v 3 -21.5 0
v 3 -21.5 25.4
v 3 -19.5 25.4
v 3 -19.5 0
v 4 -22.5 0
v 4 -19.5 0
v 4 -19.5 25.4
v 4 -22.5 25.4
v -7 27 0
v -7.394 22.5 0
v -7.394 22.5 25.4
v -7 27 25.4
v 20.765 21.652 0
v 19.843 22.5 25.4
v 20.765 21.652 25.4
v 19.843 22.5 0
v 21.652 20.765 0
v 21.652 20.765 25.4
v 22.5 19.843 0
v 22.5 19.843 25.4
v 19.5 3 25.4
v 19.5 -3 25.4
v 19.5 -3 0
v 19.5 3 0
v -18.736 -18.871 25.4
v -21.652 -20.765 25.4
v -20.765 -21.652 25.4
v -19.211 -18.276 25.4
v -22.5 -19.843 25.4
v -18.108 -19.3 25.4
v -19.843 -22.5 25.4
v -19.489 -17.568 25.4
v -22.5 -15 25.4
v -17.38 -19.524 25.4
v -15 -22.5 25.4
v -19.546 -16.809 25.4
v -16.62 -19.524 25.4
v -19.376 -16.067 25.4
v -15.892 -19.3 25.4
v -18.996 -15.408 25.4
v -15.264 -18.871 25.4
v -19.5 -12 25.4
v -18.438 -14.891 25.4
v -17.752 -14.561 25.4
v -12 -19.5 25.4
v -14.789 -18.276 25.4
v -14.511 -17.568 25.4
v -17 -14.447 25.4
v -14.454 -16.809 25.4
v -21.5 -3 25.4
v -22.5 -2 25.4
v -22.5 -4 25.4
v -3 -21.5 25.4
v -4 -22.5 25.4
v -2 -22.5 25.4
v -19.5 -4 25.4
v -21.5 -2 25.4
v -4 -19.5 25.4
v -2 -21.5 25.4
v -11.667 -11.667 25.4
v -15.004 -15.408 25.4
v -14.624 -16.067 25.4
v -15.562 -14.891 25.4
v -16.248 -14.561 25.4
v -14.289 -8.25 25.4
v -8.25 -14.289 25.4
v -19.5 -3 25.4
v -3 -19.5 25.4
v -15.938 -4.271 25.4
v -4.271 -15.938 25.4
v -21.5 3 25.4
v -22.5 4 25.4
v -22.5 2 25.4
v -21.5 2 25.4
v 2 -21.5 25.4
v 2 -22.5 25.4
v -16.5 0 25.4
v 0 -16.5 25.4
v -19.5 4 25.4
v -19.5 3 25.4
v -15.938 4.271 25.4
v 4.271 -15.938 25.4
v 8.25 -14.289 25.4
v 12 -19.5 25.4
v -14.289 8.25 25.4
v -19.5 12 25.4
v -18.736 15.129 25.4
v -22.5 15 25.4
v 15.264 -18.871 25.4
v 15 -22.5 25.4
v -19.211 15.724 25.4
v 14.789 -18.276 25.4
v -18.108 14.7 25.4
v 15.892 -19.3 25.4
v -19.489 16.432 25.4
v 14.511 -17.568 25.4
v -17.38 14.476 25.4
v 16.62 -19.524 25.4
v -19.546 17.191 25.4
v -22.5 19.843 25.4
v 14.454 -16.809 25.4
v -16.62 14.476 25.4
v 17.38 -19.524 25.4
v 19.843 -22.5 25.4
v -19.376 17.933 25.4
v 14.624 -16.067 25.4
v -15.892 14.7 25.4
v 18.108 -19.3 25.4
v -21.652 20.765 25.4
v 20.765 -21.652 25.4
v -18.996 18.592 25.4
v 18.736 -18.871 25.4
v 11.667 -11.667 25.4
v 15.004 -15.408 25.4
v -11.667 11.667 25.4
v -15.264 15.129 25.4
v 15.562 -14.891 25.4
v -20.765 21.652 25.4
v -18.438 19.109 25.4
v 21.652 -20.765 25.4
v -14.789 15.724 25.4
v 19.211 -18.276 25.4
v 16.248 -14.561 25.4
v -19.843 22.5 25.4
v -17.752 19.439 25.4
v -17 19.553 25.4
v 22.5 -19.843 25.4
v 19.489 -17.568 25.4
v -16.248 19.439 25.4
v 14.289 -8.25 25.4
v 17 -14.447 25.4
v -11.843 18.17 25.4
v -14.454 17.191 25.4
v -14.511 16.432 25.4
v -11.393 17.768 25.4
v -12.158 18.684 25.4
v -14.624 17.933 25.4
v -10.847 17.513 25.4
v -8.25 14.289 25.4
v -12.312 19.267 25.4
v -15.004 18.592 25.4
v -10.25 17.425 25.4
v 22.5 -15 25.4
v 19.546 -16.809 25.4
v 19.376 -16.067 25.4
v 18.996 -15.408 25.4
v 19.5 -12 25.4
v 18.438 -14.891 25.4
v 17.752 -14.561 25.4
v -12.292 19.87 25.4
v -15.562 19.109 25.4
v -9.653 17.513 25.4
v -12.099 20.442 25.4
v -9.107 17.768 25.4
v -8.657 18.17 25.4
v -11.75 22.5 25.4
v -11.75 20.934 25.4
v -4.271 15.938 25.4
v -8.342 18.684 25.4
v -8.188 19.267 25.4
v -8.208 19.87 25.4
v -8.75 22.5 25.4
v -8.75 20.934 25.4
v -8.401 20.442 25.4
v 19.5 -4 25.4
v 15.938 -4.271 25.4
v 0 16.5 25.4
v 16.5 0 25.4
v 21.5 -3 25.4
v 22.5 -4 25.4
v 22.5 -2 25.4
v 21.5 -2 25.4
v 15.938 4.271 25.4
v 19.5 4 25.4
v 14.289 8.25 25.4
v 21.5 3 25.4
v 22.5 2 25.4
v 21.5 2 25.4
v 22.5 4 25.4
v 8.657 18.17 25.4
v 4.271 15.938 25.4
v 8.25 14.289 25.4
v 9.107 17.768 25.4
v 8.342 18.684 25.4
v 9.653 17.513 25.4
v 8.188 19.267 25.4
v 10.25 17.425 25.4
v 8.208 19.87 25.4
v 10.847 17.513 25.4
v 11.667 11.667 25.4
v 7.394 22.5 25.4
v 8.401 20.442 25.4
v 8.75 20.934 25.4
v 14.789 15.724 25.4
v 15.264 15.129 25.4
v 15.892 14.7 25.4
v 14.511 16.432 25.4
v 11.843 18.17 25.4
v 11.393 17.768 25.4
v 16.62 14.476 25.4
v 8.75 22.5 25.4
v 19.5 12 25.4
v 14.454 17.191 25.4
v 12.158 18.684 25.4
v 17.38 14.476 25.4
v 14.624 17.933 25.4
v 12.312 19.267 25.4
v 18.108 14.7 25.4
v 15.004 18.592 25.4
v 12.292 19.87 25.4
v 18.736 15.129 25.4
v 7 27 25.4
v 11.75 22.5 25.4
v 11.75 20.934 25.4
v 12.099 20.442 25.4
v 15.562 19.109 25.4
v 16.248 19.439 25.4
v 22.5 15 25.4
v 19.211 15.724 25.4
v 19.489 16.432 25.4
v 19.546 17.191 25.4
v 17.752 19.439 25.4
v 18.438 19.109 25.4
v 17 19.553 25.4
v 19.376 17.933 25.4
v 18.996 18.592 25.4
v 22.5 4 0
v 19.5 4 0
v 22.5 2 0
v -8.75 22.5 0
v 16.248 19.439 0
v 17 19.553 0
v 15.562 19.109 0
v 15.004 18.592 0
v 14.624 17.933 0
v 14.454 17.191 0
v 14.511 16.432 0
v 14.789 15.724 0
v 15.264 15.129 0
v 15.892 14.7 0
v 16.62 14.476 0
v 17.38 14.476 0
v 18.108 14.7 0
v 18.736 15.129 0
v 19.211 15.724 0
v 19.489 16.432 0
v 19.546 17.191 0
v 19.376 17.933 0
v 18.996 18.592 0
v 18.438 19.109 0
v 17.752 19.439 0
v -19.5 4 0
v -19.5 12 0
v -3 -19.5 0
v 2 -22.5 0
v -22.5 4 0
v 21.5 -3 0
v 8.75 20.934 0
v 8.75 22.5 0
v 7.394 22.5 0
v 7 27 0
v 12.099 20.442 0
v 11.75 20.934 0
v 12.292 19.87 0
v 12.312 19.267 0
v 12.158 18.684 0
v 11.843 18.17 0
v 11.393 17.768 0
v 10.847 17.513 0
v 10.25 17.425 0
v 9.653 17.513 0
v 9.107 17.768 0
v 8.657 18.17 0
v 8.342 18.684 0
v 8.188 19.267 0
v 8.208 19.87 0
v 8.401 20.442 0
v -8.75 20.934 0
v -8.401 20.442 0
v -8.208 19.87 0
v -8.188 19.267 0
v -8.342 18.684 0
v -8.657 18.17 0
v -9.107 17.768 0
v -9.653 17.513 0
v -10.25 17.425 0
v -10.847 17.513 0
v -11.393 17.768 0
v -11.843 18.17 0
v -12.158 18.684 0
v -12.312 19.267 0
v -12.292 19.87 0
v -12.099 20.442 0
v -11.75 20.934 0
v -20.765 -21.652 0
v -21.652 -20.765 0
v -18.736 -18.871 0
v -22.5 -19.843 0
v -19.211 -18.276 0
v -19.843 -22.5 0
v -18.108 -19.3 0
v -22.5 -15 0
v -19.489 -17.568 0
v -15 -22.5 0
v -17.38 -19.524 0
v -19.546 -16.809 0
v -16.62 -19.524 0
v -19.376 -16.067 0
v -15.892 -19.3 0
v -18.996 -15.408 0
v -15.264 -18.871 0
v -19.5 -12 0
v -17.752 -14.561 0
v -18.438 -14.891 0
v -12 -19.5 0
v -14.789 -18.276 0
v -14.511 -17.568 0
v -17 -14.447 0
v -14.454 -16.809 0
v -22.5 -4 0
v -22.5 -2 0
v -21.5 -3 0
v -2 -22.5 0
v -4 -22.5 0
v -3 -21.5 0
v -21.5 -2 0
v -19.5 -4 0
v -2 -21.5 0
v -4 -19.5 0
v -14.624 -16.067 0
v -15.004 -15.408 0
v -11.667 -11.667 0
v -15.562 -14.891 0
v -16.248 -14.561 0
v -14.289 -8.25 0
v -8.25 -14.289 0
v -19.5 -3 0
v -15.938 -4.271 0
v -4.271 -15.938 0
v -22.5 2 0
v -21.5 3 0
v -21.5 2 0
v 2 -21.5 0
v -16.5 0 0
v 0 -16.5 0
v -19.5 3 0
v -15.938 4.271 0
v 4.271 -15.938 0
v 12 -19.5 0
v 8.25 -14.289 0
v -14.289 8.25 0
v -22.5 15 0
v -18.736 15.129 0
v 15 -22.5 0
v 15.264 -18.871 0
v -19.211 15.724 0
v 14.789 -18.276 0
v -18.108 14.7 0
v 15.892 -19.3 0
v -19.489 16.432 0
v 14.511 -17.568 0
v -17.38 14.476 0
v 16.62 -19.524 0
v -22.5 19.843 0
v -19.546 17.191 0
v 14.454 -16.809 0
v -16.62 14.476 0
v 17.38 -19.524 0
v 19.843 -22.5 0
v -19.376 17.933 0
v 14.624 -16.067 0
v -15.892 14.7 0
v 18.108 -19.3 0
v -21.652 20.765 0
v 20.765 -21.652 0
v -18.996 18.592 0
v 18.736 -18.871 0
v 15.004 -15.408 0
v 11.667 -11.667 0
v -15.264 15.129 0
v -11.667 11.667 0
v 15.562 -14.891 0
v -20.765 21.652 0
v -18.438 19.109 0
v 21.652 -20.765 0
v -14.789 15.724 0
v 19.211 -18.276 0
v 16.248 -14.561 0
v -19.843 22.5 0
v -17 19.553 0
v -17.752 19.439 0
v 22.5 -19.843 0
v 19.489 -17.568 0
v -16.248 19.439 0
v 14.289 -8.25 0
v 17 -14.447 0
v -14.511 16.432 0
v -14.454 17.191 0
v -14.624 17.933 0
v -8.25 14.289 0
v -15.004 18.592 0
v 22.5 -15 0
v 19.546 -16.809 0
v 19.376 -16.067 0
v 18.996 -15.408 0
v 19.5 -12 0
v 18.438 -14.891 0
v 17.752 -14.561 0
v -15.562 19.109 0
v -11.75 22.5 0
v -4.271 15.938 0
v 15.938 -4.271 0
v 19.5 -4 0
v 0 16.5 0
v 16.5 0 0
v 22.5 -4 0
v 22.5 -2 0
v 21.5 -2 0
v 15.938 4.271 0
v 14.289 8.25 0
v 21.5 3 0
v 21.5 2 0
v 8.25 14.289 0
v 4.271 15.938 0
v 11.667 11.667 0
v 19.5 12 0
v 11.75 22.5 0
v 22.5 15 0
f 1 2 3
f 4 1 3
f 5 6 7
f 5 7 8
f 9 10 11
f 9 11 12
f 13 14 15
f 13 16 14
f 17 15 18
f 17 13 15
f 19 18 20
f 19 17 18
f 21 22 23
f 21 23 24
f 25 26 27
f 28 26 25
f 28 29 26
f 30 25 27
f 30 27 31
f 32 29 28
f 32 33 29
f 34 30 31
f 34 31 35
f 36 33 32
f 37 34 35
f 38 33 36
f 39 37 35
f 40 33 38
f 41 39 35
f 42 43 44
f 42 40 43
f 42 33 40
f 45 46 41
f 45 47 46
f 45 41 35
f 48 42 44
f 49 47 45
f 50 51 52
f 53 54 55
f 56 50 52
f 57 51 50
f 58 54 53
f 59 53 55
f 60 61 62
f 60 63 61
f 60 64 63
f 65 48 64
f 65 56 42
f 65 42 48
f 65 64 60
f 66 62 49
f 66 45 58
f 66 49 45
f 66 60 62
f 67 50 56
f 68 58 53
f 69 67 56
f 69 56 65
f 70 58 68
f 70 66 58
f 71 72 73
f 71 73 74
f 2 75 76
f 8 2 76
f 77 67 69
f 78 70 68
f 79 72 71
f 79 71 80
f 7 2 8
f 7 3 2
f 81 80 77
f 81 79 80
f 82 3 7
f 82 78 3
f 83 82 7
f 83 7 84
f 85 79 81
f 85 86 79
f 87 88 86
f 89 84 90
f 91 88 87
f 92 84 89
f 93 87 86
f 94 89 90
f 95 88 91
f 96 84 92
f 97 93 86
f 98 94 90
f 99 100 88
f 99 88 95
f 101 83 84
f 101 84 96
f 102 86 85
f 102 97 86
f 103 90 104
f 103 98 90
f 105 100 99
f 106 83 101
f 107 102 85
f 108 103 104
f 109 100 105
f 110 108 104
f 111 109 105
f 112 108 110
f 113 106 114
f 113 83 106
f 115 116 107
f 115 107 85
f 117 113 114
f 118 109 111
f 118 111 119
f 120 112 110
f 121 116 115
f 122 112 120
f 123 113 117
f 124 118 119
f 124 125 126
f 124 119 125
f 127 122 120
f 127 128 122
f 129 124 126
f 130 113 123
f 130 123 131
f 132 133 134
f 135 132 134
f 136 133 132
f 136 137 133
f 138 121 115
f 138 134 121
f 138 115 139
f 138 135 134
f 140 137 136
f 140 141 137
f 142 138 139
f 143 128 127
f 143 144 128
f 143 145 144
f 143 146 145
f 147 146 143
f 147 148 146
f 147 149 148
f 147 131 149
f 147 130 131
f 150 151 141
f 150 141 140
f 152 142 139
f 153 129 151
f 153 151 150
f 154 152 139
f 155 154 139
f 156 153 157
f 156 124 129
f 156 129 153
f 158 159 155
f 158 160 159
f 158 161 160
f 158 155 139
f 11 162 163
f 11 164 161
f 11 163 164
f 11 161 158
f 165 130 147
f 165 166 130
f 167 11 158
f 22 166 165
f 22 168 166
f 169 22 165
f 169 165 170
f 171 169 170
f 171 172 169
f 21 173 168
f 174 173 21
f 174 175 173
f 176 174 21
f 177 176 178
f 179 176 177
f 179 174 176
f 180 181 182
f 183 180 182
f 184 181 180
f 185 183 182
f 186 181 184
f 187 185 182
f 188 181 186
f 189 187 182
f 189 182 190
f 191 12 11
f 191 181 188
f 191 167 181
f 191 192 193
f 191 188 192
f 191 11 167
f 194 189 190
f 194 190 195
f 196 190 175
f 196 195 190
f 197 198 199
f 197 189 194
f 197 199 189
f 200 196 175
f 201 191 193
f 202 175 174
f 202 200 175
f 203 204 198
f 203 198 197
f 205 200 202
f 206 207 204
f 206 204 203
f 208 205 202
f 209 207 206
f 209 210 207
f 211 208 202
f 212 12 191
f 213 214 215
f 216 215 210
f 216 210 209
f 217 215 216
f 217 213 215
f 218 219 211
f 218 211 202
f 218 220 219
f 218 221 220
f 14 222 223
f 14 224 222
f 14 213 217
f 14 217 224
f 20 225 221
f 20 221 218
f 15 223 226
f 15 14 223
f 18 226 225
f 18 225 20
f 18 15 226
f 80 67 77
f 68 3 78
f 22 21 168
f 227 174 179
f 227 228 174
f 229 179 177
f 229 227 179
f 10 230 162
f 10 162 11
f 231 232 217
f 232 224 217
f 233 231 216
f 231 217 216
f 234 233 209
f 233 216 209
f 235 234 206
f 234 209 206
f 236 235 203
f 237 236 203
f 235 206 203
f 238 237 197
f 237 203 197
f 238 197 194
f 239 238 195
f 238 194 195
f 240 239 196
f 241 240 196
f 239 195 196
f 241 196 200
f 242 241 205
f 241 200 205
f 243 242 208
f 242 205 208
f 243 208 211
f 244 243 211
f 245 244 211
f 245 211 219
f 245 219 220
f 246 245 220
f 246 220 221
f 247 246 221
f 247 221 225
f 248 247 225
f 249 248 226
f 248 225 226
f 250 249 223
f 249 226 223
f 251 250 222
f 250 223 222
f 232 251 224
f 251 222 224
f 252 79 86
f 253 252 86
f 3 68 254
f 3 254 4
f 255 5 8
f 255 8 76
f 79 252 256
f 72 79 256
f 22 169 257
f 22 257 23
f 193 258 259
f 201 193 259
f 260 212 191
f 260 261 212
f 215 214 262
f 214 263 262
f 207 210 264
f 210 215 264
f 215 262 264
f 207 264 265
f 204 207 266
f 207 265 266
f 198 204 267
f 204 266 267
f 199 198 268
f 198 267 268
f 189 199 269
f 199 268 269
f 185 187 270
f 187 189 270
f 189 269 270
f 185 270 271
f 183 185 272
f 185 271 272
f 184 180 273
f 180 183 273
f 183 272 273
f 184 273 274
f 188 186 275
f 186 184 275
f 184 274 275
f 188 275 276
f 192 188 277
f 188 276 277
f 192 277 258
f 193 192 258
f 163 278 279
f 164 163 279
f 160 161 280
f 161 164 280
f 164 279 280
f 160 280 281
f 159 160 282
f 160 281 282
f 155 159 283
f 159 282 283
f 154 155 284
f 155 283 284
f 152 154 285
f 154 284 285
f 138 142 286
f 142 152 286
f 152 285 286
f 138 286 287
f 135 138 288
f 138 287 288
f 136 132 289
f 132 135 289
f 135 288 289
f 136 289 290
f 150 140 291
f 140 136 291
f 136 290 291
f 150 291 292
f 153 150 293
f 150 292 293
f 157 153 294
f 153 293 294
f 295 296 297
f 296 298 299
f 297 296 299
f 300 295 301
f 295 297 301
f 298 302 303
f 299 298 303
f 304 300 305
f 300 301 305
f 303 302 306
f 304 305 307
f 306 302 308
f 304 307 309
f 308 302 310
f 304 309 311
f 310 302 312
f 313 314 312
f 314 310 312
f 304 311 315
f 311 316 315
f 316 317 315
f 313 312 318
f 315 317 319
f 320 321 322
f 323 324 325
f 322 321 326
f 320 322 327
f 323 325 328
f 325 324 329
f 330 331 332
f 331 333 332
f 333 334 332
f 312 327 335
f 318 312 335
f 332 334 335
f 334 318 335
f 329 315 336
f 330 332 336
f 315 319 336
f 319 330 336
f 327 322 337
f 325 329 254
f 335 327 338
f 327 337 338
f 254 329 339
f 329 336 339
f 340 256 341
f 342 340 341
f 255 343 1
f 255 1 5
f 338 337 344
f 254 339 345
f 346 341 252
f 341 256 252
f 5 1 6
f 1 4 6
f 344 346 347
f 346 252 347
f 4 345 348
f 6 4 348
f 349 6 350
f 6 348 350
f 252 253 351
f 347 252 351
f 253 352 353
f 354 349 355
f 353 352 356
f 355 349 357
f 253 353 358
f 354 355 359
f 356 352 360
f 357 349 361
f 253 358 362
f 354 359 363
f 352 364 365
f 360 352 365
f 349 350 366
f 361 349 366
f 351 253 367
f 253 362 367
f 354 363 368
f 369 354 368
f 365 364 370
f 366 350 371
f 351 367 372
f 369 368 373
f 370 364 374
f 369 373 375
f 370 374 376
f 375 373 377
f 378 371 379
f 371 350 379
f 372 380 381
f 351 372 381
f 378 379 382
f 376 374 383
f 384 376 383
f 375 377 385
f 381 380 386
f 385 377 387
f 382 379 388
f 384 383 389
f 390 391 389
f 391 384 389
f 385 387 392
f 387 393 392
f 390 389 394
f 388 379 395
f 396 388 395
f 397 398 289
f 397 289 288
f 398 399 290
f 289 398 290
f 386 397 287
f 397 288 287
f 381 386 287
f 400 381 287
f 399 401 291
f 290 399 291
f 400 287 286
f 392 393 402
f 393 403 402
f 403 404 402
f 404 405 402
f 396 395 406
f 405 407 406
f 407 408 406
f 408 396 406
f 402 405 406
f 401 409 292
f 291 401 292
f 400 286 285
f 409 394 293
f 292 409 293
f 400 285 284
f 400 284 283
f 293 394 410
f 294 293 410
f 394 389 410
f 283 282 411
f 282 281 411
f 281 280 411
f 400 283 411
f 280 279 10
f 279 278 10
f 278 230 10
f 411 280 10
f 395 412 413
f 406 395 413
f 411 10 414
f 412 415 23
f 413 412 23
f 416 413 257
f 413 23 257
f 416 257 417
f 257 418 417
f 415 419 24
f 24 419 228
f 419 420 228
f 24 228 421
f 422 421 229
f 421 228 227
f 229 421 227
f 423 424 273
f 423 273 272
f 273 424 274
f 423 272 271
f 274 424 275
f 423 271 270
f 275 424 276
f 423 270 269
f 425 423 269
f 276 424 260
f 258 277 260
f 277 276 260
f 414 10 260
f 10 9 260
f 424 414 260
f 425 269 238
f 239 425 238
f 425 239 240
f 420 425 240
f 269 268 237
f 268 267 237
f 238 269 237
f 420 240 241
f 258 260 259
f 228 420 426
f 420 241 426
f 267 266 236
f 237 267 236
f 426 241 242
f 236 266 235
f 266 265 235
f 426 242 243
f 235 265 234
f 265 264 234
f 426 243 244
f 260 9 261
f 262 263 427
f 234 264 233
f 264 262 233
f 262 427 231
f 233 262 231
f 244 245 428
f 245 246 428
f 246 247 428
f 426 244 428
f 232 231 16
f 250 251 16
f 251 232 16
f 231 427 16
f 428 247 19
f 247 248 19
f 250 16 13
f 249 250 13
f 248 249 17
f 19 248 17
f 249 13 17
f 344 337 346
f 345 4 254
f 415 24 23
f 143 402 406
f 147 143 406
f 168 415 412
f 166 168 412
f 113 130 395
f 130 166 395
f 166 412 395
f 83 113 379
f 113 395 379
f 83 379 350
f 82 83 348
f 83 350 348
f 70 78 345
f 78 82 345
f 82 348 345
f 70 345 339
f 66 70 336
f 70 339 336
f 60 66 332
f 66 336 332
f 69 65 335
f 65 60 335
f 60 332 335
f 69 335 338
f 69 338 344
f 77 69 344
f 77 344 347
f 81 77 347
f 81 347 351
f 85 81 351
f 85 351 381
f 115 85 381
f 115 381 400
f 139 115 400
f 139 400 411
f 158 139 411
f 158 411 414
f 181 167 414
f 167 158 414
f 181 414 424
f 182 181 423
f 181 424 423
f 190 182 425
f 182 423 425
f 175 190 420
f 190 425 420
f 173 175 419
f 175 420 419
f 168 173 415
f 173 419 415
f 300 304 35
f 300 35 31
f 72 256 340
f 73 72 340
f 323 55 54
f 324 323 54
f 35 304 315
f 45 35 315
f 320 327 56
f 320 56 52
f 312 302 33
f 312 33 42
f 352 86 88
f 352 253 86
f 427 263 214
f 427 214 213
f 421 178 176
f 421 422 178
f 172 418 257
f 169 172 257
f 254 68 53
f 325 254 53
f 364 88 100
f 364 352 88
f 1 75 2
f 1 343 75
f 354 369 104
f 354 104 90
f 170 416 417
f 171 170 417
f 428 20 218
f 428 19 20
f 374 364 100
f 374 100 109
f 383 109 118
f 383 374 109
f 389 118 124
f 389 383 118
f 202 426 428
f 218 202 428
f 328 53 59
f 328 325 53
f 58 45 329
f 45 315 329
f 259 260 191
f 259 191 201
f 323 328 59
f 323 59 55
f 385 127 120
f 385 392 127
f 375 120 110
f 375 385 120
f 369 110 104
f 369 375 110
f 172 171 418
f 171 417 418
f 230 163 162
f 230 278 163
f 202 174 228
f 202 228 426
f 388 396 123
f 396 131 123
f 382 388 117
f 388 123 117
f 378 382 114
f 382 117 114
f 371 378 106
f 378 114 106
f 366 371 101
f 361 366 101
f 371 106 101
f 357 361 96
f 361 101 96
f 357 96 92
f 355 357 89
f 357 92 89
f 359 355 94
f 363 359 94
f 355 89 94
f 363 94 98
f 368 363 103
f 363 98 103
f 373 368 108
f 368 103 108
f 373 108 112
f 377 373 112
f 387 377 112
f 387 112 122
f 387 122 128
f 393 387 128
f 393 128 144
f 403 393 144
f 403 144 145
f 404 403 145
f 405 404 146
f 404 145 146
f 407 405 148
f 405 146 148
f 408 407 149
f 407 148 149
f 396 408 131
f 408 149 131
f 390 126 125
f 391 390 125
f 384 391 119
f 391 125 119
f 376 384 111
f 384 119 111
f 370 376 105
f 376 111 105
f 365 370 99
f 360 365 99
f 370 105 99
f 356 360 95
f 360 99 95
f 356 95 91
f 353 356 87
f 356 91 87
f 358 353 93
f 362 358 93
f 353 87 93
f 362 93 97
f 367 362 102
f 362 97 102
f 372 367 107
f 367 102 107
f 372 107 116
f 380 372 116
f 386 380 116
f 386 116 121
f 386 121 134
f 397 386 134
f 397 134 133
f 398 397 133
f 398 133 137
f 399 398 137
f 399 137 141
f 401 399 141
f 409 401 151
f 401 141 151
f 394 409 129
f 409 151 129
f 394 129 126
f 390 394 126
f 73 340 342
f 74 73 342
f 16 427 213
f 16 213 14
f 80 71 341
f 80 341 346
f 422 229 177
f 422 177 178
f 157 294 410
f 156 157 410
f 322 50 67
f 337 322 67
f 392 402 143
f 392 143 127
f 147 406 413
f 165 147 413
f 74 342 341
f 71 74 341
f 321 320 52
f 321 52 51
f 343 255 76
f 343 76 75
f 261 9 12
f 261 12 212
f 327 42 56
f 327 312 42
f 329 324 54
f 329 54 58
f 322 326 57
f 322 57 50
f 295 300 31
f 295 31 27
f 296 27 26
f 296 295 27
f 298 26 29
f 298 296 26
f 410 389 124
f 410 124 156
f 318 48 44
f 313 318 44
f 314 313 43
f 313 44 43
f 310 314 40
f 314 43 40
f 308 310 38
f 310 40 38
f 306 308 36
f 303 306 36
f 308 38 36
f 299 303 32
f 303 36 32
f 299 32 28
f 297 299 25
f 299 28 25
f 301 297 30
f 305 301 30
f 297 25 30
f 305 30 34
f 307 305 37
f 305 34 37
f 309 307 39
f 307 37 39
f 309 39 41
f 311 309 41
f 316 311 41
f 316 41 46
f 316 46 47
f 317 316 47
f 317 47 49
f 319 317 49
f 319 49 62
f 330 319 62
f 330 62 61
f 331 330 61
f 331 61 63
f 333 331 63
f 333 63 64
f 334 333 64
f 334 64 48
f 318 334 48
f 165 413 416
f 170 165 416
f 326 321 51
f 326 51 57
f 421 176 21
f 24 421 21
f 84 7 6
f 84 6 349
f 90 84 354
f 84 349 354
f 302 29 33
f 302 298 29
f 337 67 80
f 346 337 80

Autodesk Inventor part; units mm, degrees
ref_plane "YZ Plane" through (0, 0, 0) normal (1, 0, 0) x (0, 1, 0)
ref_plane "XZ Plane" through (0, 0, 0) normal (0, 1, 0) x (-1, 0, 0)
ref_plane "XY Plane" through (0, 0, 0) normal (0, 0, 1) x (1, 0, 0)
sketch "Sketch1" plane through (0, 0, 0) normal (0, 0, 1) x (1, 0, 0)
  circle A0 centre (0, 0) radius 16.5
  arc A1 (-19.8431, 22.5) -> (-22.5, 19.8431) centre (0, 0) ccw
  arc A2 (22.5, 19.8431) -> (19.8431, 22.5) centre (0, 0) ccw
  arc A3 (-22.5, -19.8431) -> (-19.8431, -22.5) centre (0, 0) ccw
  arc A4 (19.8431, -22.5) -> (22.5, -19.8431) centre (0, 0) ccw
  line L0 (-22.5, -15) -> (-19.5, -12)
  line L1 (-19.5, 12) -> (-22.5, 15)
  line L2 (-15, -22.5) -> (-12, -19.5)
  line L3 (12, -19.5) -> (15, -22.5)
  line L4 (22.5, -15) -> (19.5, -12)
  line L5 (19.5, 12) -> (22.5, 15)
  line L6 (-22.5, -19.8431) -> (-22.5, -15)
  line L7 (-22.5, 15) -> (-22.5, 19.8431)
  line L8 (19.8431, -22.5) -> (15, -22.5)
  line L9 (-15, -22.5) -> (-19.8431, -22.5)
  line L10 (22.5, 19.8431) -> (22.5, 15)
  line L11 (22.5, -15) -> (22.5, -19.8431)
  line L12 (19.5, 4) -> (22.5, 4)
  line L13 (22.5, 4) -> (22.5, 2)
  line L14 (22.5, 2) -> (21.5, 2)
  line L15 (21.5, 2) -> (21.5, 3)
  line L16 (21.5, 3) -> (19.5, 3)
  line L17 (19.5, -4) -> (22.5, -4)
  line L18 (22.5, -4) -> (22.5, -2)
  line L19 (22.5, -2) -> (21.5, -2)
  line L20 (21.5, -2) -> (21.5, -3)
  line L21 (21.5, -3) -> (19.5, -3)
  line L22 (4, -19.5) -> (4, -22.5)
  line L23 (4, -22.5) -> (2, -22.5)
  line L24 (2, -22.5) -> (2, -21.5)
  line L25 (2, -21.5) -> (3, -21.5)
  line L26 (3, -21.5) -> (3, -19.5)
  line L27 (-3, -19.5) -> (-3, -21.5)
  line L28 (-3, -21.5) -> (-2, -21.5)
  line L29 (-2, -21.5) -> (-2, -22.5)
  line L30 (-2, -22.5) -> (-4, -22.5)
  line L31 (-4, -22.5) -> (-4, -19.5)
  line L32 (-19.5, -4) -> (-22.5, -4)
  line L33 (-22.5, -4) -> (-22.5, -2)
  line L34 (-22.5, -2) -> (-21.5, -2)
  line L35 (-21.5, -2) -> (-21.5, -3)
  line L36 (-21.5, -3) -> (-19.5, -3)
  line L37 (-19.5, 4) -> (-22.5, 4)
  line L38 (-22.5, 4) -> (-22.5, 2)
  line L39 (-22.5, 2) -> (-21.5, 2)
  line L40 (-21.5, 2) -> (-21.5, 3)
  line L41 (-21.5, 3) -> (-19.5, 3)
  line L42 (-12, -19.5) -> (-4, -19.5)
  line L43 (-3, -19.5) -> (3, -19.5)
  line L44 (4, -19.5) -> (12, -19.5)
  line L45 (-19.5, -12) -> (-19.5, -4)
  line L46 (-19.5, -3) -> (-19.5, 3)
  line L47 (-19.5, 4) -> (-19.5, 12)
  line L48 (19.5, -12) -> (19.5, -4)
  line L49 (19.5, -3) -> (19.5, 3)
  line L50 (19.5, 4) -> (19.5, 12)
  line L51 (-7.3937, 22.5) -> (-7, 27)
  line L52 (-7, 27) -> (7, 27)
  line L53 (7, 27) -> (7.3937, 22.5)
  arc A5 (-11.75, 20.9337) -> (-8.75, 20.9337) centre (-10.25, 19.5) ccw
  arc A6 (8.75, 20.9337) -> (11.75, 20.9337) centre (10.25, 19.5) ccw
  line L54 (-8.75, 20.9337) -> (-8.75, 22.5)
  line L55 (-11.75, 20.9337) -> (-11.75, 22.5)
  line L56 (8.75, 20.9337) -> (8.75, 22.5)
  line L57 (-19.8431, 22.5) -> (-11.75, 22.5)
  line L58 (-8.75, 22.5) -> (-7.3937, 22.5)
  line L59 (11.75, 20.9337) -> (11.75, 22.5)
  line L60 (7.3937, 22.5) -> (8.75, 22.5)
  line L61 (11.75, 22.5) -> (19.8431, 22.5)
  point P0 (-17, 17)
  point P1 (17, 17)
  point P2 (17, -17)
  point P3 (-17, -17)
  dimension "d0" = 33
  dimension "d7" = 30
  dimension "d8" = 30
  dimension "d9" = 30
  dimension "d10" = 30
  dimension "d14" = 30
  dimension "d15" = 15
  dimension "d16" = 15
  dimension "d19" = 22.5
  dimension "d22" = 8
  dimension "d23" = 4
  dimension "d24" = 2
  dimension "d25" = 1
  dimension "d27" = 1
  dimension "d28" = 3
  dimension "d29" = 4
  dimension "d30" = 8
  dimension "d31" = 19.5
  dimension "d32" = 19.5
  dimension "d33" = 19.5
  dimension "d34" = 17
  dimension "d35" = 17
  dimension "d36" = 17
  dimension "d37" = 17
  dimension "d38" = 14
  dimension "d39" = 7
  dimension "d40" = 14.7874
  dimension "d42" = 7.3937
  dimension "d47" = 4.15
  dimension "d48" = 20.5
  dimension "d49" = 10.25
  dimension "d51" = 1.5
  dimension "d56" = 1.5
  dimension "d57" = 3
  dimension "d58" = 22.5
  dimension "d59" = 4.5
extrude "SMC, 32MM" add sketch "Sketch1" along normal blind 25.4
hole "Hole1" at (-17, 17, 0) at (17, 17, 0) at (17, -17, 0) at (-17, -17, 0) direction (0, 0, 1) diameter 5.1054 end through all
equation "\"d16\" = d15"
equation "\"d23\" = 0.5 * d22"
equation "\"d27\" = d25"
equation "\"d29\" = 0.5 * d22"
equation "\"d30\" = d22"
equation "\"d32\" = d31"
equation "\"d35\" = d34"
equation "\"d36\" = d34"
equation "\"d37\" = d35"
equation "\"d39\" = 0.5 * d38"
equation "\"d11\" = d5"
equation "\"d12\" = d6"
equation "\"d5\" = 22.5"
equation "\"d6\" = 22.5"
properties part number "EXTRUSION, CYLINDER, ALUMINIUM, SMC, 32MM" material "Extrusion, Aluminum, SMC, 32 MM"
